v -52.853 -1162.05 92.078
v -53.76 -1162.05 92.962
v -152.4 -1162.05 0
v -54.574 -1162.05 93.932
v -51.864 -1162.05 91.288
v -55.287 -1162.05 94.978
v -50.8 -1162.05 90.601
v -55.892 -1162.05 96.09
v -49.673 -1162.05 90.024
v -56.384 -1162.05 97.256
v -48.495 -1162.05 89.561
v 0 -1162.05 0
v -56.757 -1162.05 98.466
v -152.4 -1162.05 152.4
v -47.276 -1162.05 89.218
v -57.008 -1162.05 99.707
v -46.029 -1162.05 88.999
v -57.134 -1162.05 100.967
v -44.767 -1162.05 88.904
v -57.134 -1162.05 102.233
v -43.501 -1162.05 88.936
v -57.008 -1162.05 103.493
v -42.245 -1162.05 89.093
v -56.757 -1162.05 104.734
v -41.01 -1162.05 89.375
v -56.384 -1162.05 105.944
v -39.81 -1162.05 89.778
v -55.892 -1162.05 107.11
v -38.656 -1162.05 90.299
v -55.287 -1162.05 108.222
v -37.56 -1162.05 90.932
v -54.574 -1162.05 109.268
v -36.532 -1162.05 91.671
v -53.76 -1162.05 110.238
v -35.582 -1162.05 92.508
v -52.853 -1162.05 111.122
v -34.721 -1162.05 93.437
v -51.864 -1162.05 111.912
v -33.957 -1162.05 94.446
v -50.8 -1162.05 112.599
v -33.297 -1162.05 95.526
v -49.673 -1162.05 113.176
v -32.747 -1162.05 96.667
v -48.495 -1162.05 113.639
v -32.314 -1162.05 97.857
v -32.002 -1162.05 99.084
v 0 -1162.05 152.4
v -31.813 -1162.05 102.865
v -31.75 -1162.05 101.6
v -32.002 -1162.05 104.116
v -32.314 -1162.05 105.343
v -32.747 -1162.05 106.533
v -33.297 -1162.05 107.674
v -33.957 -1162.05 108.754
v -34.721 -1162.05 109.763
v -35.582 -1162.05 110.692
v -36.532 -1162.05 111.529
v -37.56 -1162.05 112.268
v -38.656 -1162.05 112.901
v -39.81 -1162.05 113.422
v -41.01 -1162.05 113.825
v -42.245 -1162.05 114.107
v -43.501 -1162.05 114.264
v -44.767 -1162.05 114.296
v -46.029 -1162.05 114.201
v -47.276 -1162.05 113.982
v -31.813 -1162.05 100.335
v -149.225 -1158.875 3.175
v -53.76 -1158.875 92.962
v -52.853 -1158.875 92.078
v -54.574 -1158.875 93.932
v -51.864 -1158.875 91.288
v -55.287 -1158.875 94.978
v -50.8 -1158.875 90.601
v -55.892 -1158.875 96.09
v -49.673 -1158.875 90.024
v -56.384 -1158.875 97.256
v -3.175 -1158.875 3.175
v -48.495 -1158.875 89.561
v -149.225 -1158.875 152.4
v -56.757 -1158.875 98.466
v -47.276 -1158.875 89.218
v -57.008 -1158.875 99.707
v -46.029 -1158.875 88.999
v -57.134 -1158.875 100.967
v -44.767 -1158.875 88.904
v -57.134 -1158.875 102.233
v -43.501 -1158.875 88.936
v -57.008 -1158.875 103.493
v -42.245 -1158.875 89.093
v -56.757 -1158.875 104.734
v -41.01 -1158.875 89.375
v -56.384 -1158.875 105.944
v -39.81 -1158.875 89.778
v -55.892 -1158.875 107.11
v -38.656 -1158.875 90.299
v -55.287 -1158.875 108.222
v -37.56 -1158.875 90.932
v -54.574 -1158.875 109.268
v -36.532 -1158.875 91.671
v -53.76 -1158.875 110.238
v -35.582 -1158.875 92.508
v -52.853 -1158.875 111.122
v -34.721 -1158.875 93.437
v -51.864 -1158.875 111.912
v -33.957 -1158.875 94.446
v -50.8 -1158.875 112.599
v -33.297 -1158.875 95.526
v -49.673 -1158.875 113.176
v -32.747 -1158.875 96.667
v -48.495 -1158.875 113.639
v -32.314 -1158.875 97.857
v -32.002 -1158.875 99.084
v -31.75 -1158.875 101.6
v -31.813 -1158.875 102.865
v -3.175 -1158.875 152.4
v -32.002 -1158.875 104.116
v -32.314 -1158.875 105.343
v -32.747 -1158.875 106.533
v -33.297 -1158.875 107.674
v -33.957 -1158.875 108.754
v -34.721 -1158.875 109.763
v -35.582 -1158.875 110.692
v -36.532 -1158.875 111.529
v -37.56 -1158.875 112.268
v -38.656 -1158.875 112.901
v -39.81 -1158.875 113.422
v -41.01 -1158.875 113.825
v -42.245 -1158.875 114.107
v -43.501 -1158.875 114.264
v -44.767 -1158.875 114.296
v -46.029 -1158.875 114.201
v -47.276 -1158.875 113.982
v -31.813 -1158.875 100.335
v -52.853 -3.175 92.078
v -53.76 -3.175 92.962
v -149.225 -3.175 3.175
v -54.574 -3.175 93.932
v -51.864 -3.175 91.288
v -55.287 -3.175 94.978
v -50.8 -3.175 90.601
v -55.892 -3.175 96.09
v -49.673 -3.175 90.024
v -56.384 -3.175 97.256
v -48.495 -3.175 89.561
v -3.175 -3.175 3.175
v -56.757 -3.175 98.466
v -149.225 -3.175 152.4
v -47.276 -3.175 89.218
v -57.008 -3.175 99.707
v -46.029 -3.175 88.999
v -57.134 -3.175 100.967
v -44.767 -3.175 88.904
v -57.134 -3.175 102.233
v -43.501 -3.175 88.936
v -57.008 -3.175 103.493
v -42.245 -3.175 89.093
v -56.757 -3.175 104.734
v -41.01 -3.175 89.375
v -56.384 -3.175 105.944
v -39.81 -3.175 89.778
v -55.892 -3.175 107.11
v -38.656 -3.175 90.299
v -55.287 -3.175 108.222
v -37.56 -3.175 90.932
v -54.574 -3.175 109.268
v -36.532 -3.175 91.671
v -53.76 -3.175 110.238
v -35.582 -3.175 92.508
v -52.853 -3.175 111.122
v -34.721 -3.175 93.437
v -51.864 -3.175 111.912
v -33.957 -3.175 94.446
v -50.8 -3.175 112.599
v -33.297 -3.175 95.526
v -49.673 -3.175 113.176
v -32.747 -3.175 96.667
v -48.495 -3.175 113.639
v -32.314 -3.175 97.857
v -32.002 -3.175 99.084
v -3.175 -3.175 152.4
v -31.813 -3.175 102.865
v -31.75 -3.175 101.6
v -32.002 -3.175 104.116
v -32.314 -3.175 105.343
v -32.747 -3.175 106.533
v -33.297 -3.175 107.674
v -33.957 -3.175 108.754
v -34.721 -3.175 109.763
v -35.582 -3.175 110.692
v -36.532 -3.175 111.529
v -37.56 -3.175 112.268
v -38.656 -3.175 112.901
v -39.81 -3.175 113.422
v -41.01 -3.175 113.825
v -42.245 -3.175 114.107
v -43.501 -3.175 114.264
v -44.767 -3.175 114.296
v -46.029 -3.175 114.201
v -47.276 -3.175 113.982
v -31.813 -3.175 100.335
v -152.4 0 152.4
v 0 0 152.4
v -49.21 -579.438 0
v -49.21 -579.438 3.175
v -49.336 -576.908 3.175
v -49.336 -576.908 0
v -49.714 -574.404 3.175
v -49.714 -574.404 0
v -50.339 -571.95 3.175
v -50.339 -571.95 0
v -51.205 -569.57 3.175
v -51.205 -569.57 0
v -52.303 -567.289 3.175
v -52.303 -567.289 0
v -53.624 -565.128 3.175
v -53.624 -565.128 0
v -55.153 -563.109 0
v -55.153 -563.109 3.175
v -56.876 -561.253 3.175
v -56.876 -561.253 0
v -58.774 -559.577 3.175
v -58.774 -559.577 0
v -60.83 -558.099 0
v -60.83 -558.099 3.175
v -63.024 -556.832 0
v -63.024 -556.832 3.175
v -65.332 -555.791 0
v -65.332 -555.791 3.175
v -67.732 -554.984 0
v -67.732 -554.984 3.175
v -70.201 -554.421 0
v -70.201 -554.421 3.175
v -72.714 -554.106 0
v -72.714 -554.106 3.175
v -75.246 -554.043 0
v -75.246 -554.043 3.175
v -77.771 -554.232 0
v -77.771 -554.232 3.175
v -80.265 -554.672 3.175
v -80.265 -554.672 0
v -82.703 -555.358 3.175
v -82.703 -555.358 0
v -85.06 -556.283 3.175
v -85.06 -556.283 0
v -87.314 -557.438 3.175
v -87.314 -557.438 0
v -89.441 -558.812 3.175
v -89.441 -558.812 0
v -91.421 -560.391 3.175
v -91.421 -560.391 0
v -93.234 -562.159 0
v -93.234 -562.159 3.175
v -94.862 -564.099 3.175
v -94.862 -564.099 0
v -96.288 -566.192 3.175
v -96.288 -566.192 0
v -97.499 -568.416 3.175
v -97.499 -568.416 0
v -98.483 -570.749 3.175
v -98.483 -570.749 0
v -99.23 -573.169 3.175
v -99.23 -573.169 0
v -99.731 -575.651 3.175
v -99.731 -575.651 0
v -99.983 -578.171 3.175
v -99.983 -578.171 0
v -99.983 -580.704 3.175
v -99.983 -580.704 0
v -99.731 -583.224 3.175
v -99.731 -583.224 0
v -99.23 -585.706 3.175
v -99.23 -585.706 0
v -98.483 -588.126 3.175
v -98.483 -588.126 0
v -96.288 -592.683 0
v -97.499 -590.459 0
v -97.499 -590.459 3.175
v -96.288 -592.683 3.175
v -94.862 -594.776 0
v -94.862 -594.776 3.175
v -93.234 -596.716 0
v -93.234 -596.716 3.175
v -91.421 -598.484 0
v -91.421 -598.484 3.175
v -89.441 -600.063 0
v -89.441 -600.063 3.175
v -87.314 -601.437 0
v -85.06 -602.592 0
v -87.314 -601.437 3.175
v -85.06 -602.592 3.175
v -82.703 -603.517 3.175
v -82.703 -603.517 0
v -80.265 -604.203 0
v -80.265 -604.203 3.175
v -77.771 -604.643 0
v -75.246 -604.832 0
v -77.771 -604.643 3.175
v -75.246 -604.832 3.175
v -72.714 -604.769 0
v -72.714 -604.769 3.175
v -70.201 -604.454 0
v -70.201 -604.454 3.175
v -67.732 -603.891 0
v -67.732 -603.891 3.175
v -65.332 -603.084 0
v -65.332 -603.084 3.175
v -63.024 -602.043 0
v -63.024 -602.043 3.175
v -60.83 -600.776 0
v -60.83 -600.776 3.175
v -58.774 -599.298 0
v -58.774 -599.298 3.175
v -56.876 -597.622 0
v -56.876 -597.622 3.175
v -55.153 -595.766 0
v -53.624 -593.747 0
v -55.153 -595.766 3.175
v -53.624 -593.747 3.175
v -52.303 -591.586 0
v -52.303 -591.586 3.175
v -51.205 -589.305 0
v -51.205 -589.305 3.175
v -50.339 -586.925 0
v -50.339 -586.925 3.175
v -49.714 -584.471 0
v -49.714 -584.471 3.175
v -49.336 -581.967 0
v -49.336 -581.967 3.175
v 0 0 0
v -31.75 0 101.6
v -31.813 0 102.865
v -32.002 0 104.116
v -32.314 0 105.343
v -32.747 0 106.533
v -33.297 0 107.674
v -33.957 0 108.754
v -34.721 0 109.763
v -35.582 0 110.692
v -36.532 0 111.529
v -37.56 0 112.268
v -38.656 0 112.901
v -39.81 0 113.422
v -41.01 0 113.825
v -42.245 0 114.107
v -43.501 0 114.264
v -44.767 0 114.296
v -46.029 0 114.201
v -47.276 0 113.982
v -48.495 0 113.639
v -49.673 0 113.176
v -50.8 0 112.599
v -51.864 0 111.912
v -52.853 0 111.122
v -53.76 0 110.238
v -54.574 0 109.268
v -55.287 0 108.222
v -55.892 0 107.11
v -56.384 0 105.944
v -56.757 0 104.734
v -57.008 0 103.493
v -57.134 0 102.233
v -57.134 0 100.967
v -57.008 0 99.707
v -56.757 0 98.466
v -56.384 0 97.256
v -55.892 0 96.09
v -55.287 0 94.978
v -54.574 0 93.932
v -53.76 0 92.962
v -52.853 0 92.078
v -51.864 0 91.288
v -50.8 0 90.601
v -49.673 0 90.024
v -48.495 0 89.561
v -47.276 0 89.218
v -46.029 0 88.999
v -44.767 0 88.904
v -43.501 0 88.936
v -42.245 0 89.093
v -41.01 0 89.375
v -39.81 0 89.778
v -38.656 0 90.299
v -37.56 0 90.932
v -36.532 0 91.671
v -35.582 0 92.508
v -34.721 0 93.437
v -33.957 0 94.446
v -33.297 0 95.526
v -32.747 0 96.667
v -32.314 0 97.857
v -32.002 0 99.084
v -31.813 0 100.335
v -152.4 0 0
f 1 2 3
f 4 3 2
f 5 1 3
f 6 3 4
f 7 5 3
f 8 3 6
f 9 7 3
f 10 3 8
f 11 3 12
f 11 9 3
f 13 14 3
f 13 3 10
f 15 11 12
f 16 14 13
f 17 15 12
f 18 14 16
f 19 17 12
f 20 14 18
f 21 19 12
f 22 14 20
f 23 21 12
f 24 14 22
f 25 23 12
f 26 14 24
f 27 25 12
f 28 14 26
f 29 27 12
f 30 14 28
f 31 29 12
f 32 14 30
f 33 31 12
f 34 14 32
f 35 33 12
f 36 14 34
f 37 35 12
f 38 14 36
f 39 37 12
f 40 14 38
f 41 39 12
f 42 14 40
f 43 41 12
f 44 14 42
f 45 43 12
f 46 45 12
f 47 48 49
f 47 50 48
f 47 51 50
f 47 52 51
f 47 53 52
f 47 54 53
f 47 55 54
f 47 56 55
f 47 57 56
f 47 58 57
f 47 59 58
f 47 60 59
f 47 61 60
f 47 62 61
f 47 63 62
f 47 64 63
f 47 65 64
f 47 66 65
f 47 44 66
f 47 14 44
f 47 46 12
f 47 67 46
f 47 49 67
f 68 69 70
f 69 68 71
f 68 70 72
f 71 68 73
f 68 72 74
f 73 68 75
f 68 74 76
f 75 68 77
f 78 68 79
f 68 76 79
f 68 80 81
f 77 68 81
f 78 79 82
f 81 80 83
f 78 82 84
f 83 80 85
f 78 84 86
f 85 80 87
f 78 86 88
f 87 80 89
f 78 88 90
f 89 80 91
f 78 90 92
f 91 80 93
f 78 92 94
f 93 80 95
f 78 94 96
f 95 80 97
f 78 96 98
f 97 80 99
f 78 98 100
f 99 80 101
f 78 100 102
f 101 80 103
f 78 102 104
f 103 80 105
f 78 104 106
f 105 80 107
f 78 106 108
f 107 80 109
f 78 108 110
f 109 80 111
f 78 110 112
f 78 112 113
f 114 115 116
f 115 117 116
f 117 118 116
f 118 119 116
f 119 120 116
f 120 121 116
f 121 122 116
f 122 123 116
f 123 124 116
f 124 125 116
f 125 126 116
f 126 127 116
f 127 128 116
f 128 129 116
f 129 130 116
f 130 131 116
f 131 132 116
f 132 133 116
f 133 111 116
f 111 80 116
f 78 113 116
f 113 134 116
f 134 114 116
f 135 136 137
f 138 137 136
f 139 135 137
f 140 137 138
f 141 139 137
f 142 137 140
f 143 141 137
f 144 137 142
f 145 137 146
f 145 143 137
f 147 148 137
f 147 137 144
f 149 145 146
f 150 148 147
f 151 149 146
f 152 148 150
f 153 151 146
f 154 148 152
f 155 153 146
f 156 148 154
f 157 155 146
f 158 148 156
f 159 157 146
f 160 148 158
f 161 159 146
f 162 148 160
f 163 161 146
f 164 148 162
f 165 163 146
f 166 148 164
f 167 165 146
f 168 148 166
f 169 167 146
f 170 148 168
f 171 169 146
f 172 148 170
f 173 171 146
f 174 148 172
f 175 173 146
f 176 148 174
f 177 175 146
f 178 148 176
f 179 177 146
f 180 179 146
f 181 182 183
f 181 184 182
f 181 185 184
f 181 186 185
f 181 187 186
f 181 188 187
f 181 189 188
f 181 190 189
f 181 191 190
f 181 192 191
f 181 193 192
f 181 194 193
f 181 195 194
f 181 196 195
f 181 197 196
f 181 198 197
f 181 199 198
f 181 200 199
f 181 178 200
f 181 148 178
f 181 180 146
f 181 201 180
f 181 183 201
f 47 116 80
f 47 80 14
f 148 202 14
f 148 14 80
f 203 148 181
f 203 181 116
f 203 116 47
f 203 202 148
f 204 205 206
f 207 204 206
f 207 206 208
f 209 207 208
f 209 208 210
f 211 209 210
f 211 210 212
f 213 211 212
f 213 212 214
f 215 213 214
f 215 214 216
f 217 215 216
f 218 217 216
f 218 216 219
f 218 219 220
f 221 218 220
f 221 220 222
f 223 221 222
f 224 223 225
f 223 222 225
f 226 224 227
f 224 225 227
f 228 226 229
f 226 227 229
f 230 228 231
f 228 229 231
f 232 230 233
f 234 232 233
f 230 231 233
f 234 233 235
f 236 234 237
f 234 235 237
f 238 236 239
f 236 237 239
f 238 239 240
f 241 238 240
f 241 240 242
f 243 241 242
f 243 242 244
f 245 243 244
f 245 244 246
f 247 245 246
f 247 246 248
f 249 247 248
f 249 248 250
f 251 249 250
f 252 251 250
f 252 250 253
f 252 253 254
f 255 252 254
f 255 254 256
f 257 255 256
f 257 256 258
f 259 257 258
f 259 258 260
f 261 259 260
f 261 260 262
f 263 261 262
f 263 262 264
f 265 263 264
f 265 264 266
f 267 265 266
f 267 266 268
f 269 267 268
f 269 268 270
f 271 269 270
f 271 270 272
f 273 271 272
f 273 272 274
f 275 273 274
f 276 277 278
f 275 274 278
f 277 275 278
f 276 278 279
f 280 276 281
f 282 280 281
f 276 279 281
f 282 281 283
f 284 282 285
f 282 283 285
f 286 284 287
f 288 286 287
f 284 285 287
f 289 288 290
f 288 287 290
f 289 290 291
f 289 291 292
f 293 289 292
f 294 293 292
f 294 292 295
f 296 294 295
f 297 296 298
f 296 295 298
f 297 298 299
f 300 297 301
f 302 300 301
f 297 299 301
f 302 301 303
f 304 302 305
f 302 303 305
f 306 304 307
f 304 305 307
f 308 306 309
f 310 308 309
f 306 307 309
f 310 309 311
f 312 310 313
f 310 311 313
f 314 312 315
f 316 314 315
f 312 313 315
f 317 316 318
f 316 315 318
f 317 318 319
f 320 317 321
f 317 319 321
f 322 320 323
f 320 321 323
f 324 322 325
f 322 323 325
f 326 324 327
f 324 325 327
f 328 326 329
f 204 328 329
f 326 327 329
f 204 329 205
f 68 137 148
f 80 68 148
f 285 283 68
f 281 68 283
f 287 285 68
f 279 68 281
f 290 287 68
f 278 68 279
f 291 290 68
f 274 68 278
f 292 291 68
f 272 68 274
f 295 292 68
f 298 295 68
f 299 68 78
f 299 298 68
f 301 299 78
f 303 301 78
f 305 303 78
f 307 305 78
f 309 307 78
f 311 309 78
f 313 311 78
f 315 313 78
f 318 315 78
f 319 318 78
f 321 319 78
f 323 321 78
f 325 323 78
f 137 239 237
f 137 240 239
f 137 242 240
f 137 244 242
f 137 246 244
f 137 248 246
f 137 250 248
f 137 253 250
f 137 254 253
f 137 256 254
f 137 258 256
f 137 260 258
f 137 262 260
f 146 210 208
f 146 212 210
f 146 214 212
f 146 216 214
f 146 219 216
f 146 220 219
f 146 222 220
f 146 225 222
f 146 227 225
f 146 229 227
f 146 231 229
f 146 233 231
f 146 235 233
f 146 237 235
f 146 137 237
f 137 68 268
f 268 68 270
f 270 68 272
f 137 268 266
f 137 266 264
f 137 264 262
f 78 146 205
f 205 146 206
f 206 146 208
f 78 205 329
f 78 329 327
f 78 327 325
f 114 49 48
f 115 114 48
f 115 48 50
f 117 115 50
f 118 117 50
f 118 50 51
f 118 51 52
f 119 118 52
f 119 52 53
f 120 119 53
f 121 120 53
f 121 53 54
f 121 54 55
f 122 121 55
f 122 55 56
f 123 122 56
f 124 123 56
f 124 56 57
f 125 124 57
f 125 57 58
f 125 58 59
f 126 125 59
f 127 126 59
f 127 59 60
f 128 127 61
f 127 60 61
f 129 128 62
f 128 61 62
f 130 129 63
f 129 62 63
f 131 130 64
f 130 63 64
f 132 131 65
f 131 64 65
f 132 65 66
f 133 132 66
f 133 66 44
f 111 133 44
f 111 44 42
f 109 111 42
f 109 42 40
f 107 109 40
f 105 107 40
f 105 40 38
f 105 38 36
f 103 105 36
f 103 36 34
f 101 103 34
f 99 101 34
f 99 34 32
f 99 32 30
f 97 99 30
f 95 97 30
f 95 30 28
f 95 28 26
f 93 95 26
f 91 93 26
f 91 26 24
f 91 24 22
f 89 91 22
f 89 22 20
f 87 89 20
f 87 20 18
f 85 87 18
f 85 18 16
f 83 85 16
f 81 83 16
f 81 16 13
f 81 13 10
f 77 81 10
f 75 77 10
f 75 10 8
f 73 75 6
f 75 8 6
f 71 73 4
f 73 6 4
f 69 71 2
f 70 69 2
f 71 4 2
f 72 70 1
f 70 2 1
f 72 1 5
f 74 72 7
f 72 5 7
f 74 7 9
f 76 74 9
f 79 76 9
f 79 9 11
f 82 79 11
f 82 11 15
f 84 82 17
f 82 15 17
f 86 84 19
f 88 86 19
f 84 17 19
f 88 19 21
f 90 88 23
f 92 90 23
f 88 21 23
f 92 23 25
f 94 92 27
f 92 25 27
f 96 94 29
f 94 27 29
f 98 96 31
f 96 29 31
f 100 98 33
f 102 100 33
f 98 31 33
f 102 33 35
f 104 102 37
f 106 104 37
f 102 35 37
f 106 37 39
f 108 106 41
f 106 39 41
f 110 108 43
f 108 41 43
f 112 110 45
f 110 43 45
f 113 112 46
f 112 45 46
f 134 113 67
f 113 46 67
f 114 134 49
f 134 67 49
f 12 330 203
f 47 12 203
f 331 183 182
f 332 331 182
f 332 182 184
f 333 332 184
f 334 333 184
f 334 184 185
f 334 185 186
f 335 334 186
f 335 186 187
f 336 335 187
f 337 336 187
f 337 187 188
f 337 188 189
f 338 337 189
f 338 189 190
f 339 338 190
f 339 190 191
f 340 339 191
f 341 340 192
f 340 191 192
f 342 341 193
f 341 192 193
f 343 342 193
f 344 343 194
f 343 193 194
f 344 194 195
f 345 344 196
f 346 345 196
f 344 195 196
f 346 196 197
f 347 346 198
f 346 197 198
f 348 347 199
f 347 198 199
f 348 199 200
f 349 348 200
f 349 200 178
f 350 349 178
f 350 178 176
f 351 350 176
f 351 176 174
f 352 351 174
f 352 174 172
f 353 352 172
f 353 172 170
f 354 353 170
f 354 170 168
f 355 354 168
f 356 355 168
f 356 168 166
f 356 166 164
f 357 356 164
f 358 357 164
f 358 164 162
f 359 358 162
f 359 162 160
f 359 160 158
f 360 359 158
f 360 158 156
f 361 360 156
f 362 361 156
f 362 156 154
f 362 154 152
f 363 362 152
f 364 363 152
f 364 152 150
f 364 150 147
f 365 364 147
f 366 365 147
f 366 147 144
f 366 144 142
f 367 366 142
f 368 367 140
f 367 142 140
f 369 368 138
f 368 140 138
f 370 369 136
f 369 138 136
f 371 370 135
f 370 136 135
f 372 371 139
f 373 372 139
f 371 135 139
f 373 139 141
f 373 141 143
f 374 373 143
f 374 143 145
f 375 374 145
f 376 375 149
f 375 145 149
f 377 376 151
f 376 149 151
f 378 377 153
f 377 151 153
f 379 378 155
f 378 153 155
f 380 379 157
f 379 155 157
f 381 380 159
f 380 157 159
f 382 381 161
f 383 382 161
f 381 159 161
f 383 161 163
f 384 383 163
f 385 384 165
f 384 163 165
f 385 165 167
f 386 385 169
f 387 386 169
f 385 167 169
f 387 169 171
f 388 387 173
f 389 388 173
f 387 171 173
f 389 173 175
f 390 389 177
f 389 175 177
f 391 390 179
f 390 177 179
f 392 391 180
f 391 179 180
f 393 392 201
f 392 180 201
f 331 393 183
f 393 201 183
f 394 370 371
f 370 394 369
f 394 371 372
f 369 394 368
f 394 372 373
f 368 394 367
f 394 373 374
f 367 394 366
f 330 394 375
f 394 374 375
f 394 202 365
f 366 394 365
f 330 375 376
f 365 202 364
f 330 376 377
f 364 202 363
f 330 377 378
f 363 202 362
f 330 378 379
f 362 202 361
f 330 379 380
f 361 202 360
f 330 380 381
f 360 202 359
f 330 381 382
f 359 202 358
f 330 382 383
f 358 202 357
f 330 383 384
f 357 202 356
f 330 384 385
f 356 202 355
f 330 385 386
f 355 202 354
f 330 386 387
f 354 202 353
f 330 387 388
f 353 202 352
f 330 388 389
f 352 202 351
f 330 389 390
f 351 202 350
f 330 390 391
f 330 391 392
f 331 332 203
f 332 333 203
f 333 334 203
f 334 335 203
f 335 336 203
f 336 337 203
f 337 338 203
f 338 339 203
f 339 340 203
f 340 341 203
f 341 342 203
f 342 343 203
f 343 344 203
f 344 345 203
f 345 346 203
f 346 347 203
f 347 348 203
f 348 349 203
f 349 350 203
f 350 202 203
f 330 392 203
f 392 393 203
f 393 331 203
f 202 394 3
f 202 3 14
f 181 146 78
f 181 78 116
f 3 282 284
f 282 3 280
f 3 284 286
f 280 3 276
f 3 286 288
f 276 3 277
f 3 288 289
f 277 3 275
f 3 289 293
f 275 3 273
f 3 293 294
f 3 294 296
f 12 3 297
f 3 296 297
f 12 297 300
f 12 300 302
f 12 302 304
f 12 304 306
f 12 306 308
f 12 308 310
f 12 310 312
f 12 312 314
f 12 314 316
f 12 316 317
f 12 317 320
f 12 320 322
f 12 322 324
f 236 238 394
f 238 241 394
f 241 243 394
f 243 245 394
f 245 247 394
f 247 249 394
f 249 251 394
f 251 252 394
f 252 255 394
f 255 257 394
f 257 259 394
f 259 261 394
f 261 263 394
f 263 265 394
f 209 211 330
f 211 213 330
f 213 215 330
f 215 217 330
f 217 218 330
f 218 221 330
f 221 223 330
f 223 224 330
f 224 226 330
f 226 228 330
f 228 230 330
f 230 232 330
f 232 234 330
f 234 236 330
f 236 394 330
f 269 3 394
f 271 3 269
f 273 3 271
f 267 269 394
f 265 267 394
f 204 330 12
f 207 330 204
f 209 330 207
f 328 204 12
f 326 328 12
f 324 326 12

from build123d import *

# Parameters (mm, degrees)
F0_W     = 152.4
F0_H     = 152.4
F1_DEPTH = 1162.05
F2_T     = -3.175
F3_R     = 25.40254
F4_DEPTH = 3.176
F5_R     = 12.7
F6_DEPTH = 1162.051


with BuildPart() as f1:
    # F0 (on Front) → F1 (new body)
    with BuildSketch(Plane.XZ):
        with Locations((-76.2, 76.2)):
            Rectangle(F0_W, F0_H)
    extrude(amount=F1_DEPTH)

    # F2
    f2_openings = [f1.faces().sort_by_distance(p)[0] for p in [
        (-76.2, -581.025, 152.4),
    ]]
    offset(amount=F2_T, openings=f2_openings)

    # F3 (on face) → F4 (cut, through all)
    with BuildSketch(Plane.XY.offset(3.175)):
        with Locations((-74.6125, -579.4375)):
            Circle(F3_R)
    extrude(amount=-F4_DEPTH, mode=Mode.SUBTRACT)

    # F5 (on face) → F6 (cut, through all)
    with BuildSketch(Plane.XZ.offset(1162.05)):
        with Locations((-44.45, 101.6)):
            Circle(F5_R)
    extrude(amount=-F6_DEPTH, mode=Mode.SUBTRACT)


solid = f1.part
